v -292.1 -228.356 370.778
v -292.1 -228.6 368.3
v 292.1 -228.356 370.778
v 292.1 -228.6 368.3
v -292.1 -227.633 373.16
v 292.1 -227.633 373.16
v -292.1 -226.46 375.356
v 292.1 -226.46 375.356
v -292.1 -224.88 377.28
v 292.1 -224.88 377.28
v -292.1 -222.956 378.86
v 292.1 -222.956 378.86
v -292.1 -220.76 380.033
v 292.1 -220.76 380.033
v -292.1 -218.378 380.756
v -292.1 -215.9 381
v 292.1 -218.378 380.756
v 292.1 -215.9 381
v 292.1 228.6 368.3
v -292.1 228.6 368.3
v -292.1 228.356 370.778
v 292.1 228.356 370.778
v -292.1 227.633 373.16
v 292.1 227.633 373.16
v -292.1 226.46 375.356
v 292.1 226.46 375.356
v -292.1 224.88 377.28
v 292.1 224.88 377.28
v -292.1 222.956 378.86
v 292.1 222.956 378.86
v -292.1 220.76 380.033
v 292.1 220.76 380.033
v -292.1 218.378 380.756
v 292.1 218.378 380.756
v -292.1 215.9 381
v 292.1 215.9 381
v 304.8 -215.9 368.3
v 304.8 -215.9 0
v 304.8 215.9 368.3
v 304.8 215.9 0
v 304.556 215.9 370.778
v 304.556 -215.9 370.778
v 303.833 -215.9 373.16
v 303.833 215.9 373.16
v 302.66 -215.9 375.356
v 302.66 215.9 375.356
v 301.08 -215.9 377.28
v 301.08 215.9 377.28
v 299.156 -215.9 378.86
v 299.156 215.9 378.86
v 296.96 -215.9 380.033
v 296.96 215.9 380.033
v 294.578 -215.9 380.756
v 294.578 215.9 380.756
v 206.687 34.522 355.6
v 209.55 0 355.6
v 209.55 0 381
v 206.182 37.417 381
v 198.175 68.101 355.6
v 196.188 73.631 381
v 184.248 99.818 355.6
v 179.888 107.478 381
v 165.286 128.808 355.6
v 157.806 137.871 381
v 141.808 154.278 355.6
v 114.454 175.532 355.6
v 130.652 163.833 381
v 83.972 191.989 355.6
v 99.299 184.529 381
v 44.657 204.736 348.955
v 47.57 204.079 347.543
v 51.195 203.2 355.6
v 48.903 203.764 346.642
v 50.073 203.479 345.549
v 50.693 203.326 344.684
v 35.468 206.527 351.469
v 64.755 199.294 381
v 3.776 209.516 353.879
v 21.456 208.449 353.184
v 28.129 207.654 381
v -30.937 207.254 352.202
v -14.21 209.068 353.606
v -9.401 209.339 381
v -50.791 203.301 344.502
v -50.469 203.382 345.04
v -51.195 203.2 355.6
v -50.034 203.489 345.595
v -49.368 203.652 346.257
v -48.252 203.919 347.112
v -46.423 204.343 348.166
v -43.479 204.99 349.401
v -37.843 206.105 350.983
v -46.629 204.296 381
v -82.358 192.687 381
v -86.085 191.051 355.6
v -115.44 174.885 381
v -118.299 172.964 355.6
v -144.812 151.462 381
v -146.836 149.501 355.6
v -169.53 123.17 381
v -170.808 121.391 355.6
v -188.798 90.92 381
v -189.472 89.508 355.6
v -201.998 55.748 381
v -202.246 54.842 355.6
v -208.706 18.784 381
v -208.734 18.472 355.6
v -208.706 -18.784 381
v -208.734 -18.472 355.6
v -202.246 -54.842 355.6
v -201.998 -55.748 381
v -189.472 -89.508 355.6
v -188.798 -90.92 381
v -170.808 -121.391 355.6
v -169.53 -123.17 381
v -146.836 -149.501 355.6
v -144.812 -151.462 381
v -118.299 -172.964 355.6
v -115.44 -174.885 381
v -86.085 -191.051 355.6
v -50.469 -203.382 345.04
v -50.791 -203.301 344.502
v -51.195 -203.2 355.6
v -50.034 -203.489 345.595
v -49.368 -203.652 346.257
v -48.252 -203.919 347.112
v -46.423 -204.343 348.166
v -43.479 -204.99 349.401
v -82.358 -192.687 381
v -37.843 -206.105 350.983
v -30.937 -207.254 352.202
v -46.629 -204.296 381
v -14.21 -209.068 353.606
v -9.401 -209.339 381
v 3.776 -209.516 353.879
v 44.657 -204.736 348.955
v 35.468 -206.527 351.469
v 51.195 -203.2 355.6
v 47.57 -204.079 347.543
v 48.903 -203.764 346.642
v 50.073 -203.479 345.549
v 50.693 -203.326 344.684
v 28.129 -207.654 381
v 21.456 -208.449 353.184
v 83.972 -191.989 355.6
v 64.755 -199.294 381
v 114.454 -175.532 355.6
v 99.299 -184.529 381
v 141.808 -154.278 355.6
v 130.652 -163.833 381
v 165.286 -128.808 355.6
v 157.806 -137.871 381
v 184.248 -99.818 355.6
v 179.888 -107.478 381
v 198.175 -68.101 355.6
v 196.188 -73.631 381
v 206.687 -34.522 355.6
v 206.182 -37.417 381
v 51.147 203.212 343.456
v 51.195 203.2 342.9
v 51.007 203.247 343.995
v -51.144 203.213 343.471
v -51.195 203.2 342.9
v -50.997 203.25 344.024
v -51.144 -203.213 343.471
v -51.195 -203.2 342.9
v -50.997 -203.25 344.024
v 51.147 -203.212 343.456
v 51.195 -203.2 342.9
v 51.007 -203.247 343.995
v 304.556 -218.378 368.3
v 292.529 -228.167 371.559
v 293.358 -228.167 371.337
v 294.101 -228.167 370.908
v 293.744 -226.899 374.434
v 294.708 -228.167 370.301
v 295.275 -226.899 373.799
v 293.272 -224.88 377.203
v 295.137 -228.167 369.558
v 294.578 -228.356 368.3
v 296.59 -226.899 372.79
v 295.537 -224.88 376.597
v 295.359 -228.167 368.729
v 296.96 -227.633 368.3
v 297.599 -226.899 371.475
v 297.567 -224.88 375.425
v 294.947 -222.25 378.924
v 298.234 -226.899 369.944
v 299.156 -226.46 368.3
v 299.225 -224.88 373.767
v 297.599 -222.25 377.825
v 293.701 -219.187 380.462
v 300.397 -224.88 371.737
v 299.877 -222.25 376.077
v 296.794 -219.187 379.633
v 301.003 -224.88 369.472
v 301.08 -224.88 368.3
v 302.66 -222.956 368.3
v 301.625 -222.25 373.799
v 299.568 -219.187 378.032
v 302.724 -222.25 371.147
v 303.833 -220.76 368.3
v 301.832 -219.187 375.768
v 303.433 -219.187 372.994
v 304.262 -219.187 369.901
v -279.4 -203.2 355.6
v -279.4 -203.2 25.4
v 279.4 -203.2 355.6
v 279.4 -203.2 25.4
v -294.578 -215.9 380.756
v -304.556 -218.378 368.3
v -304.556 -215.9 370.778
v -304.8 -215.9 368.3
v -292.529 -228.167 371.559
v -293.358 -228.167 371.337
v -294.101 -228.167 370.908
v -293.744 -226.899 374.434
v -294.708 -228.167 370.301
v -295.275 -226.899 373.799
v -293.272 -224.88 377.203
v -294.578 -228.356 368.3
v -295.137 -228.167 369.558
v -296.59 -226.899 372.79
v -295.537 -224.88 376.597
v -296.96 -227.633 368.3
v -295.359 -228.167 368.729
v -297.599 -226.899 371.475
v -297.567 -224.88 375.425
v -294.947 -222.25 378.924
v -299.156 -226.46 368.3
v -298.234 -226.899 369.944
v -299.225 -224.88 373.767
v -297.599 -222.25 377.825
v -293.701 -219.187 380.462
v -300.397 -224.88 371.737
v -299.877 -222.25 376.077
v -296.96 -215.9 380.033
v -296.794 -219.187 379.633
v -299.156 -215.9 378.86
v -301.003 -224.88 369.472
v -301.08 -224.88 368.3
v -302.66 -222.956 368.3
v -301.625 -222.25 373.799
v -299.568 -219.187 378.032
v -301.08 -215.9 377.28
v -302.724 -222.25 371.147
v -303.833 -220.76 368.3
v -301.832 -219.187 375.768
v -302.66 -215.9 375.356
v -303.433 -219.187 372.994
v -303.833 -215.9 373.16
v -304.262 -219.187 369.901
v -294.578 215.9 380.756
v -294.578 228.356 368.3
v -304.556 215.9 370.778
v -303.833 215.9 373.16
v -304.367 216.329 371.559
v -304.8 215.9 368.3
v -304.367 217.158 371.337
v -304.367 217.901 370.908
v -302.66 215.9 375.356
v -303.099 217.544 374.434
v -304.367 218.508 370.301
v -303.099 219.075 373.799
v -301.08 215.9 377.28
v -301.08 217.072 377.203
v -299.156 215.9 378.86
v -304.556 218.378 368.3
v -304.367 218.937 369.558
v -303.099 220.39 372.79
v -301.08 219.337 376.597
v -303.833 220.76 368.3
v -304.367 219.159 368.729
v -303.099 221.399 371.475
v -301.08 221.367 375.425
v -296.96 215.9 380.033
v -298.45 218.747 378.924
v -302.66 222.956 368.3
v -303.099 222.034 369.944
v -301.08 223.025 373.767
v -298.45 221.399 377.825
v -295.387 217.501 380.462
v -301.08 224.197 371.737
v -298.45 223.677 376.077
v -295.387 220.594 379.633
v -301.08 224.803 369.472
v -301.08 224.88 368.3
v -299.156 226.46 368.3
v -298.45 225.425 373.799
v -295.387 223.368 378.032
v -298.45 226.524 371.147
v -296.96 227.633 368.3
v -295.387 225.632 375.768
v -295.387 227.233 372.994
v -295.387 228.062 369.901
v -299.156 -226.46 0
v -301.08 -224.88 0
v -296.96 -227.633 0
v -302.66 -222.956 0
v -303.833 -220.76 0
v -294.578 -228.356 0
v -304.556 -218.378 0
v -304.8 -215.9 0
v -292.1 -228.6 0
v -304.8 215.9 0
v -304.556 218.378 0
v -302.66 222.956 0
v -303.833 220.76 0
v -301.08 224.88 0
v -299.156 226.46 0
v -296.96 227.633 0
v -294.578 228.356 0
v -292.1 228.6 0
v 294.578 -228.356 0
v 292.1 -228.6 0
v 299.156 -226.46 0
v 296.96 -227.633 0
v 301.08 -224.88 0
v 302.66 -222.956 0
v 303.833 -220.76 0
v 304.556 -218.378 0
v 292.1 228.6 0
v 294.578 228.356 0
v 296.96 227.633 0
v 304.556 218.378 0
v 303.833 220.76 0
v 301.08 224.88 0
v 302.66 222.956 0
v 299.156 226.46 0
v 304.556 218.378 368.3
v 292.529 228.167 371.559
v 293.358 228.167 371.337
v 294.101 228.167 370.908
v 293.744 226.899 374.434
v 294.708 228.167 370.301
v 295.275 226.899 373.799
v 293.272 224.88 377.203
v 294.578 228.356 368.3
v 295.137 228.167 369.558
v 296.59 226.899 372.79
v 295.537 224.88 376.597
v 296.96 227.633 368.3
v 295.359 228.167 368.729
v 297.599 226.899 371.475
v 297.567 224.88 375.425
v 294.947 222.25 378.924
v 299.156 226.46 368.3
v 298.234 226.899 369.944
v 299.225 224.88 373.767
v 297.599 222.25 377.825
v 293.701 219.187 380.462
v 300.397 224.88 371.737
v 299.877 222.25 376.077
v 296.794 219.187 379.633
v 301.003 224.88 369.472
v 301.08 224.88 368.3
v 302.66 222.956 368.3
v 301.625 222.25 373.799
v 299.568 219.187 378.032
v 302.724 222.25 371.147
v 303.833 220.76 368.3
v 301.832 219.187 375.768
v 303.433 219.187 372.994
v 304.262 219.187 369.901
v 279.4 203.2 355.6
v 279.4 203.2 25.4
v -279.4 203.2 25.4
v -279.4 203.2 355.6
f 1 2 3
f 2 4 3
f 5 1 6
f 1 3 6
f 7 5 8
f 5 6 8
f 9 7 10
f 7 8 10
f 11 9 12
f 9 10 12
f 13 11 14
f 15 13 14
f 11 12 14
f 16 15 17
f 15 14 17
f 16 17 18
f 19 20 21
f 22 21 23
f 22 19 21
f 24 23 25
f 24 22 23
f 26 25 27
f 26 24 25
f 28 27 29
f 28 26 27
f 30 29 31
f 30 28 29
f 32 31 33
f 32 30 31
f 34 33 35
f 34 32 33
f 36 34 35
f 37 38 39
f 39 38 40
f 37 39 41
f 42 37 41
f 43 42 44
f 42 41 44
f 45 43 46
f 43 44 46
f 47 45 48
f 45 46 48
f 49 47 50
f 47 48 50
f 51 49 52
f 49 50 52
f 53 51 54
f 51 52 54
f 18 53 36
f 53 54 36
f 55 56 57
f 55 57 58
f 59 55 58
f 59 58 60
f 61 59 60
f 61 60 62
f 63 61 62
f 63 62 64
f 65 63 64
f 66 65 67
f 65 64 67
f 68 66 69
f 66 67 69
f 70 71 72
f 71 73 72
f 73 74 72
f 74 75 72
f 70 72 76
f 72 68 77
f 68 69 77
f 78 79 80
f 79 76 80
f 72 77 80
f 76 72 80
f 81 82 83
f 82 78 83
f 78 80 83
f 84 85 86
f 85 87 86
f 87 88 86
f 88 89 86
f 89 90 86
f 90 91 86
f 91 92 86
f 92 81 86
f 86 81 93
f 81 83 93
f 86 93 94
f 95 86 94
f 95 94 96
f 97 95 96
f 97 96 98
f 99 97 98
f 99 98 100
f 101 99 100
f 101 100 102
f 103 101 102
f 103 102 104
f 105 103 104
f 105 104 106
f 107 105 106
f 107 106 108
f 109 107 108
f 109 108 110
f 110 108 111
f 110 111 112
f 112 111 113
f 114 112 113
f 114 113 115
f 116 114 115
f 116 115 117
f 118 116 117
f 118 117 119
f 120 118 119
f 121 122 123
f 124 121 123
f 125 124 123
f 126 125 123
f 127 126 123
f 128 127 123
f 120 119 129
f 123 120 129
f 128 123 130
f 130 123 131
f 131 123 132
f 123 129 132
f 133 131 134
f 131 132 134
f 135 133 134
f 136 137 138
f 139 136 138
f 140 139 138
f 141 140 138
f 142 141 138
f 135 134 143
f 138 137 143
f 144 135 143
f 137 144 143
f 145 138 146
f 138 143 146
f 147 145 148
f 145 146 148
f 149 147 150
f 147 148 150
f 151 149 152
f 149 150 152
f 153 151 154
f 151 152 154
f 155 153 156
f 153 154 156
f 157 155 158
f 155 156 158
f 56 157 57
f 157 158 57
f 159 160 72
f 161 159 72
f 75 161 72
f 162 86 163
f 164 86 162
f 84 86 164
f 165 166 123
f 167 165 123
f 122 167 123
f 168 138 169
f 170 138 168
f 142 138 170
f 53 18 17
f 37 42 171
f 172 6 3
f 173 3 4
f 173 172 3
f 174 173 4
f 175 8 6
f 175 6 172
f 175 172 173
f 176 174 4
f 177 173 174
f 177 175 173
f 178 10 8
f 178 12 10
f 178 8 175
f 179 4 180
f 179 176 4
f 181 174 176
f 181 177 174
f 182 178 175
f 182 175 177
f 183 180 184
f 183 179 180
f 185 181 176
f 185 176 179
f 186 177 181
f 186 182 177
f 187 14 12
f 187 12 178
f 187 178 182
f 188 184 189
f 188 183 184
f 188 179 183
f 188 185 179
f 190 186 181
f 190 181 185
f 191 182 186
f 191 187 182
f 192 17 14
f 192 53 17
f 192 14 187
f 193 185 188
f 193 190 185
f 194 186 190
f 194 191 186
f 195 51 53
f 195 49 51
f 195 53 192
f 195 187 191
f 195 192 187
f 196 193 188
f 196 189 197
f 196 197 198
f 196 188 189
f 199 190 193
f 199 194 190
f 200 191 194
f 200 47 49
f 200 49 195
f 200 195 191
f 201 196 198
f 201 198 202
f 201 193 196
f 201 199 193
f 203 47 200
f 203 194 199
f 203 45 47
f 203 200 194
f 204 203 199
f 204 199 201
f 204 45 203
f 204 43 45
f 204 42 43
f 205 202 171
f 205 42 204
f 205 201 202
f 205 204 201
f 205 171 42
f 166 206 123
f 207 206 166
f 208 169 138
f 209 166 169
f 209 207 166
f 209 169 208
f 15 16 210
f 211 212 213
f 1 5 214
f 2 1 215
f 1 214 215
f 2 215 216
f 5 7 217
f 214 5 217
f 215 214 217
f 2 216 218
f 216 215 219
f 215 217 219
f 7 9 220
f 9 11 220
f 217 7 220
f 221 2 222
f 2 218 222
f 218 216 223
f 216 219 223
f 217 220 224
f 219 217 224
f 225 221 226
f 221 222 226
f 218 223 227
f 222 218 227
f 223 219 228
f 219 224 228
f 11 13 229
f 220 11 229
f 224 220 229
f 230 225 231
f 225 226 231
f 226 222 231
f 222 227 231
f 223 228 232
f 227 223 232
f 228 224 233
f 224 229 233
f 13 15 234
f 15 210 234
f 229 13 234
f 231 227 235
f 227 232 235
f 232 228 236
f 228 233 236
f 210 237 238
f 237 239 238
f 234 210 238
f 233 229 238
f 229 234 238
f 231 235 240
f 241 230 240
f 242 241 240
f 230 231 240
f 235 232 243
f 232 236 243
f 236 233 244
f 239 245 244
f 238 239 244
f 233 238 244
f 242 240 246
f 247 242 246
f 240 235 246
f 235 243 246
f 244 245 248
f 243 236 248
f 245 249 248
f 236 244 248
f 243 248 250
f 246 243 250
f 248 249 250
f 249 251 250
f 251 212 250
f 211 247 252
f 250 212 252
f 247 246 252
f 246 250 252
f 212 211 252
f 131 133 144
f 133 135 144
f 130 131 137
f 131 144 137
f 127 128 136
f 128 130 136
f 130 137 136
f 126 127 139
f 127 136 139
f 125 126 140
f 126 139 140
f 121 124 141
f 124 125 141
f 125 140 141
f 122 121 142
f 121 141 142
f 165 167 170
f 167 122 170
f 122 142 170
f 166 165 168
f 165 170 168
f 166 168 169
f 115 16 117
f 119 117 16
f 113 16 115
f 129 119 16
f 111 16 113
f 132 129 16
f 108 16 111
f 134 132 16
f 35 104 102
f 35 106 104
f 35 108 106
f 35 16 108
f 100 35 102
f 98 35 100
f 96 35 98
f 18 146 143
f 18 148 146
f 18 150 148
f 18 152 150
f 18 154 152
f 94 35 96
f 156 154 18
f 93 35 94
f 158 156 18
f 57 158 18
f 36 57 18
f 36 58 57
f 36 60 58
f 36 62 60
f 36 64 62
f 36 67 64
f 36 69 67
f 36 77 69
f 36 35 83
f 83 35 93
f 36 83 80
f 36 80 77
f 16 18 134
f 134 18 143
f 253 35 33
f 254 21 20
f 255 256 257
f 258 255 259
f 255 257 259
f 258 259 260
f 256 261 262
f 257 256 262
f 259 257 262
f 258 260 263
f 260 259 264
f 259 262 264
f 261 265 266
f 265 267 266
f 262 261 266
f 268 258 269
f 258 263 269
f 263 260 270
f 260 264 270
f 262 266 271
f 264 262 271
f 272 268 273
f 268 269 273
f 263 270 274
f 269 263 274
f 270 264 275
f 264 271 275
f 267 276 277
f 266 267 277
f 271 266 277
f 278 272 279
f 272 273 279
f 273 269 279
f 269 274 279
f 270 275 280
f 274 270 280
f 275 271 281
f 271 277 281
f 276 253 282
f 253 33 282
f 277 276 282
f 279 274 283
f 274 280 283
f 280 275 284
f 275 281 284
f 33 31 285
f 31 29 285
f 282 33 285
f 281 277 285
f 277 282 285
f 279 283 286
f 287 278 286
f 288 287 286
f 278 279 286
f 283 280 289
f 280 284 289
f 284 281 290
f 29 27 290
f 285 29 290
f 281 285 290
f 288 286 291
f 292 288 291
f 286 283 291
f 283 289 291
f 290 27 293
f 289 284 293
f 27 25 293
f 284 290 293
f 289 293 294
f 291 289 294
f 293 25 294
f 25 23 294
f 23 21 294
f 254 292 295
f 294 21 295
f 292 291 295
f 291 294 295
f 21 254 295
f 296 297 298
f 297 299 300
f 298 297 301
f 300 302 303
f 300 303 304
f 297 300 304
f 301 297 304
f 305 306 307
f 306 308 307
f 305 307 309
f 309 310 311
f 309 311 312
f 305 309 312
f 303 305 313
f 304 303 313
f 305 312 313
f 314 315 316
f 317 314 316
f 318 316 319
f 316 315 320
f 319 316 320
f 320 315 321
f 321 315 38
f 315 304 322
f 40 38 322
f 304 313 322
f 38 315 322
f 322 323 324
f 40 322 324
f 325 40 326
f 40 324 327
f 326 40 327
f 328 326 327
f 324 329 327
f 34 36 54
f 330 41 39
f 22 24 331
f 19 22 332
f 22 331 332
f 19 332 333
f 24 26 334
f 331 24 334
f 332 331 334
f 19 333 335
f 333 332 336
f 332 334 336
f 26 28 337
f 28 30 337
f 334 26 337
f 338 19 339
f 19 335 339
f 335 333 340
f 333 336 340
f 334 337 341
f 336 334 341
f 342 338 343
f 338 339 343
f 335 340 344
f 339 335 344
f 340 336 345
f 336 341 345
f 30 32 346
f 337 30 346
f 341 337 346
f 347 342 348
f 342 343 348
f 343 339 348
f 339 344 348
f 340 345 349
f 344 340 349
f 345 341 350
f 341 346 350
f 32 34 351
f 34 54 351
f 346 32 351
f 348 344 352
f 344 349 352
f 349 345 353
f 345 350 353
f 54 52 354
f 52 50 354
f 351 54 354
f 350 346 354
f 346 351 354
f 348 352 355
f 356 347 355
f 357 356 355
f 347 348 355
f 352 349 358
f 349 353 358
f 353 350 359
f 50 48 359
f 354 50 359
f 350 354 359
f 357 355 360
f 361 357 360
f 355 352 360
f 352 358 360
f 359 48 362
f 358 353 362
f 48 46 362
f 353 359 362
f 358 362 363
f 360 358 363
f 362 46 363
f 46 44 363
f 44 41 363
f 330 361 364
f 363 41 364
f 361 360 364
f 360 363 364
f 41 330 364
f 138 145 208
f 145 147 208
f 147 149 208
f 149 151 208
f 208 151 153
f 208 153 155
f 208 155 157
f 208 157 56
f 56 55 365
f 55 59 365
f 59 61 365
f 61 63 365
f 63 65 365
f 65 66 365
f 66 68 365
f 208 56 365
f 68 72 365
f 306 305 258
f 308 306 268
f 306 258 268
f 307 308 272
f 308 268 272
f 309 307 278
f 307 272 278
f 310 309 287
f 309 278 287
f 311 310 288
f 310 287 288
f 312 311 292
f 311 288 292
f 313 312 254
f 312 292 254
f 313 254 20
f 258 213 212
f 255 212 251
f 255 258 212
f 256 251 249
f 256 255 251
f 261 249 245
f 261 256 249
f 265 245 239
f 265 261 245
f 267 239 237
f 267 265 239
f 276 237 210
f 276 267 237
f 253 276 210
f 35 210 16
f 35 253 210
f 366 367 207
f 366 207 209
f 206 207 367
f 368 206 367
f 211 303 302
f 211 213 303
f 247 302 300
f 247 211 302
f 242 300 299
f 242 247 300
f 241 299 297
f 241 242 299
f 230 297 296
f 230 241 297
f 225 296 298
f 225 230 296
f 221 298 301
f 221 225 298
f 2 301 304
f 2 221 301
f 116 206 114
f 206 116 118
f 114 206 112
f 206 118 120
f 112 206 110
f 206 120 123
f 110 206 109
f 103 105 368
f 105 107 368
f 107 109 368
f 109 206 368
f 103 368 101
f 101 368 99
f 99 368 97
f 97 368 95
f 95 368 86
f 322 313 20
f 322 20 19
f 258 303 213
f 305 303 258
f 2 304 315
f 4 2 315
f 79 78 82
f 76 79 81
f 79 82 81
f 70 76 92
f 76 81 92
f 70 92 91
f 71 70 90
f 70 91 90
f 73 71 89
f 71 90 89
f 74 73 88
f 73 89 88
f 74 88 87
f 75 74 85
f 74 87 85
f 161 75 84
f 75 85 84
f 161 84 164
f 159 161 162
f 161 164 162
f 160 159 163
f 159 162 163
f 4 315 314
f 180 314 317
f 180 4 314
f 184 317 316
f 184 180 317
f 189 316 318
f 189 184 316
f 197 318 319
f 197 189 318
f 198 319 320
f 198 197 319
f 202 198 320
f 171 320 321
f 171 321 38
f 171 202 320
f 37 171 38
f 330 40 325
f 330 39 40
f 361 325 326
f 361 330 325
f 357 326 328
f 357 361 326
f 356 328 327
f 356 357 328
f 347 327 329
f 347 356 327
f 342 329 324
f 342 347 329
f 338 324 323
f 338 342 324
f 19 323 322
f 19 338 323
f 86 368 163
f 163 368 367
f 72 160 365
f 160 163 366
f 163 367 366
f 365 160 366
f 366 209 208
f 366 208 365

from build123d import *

# Parameters (mm, degrees)
F0_W         = 609.6
F0_H         = 457.2
F1_DEPTH     = 381
F2_R         = 12.7
F3_T         = -25.4
F4_R         = 209.55
F5_DEPTH     = 25.4
F6_T4_DEPTH  = 165.8906734034
F6_S5_R      = 209.55
F6_T6_DEPTH  = 85
F6_T10_DEPTH = 165.8906734034
F6_S11_R     = 209.55
F6_T12_DEPTH = 85


# Not quite as in the source:
# - a fillet or chamfer that OpenCascade refuses, or shapes differently, is made with other operations: its cross-section is extruded or revolved along the edge and cut away or added


with BuildPart() as f1:
    # F0 (on Top) → F1 (new body)
    with BuildSketch(Plane.XY):
        Rectangle(F0_W, F0_H)
    extrude(amount=F1_DEPTH)

    # F2
    f2_edges = [f1.edges().sort_by_distance(p)[0] for p in [
        (304.8, 0, 381),
        (0, 228.6, 381),
        (-304.8, 0, 381),
        (0, -228.6, 381),
        (-304.8, -228.6, 190.5),
        (304.8, -228.6, 190.5),
        (304.8, 228.6, 190.5),
        (-304.8, 228.6, 190.5),
    ]]
    fillet(f2_edges, radius=F2_R)

    # F3 (hollow: no face is removed)
    offset(amount=F3_T, mode=Mode.SUBTRACT)

    # F4 (on face) → F5 (cut)
    with BuildSketch(Plane.XY.offset(381)):
        Circle(F4_R)
    extrude(amount=-F5_DEPTH, mode=Mode.SUBTRACT)

    # F6: fillet of radius 12.7 on 2 edges, made by hand


with BuildPart() as f6_tool2:
    # F6_s3 → F6_t4 (new body)
    with BuildSketch(Plane.YZ.offset(82.9453367017)):
        with BuildLine():
            ThreePointArc((-215.9, 355.6), (-206.9197438789, 351.8802561211), (-203.2, 342.9))
            Line((-203.2, 342.9), (-203.2, 355.6))
            Line((-203.2, 355.6), (-215.9, 355.6))
        make_face()
    extrude(amount=-F6_T4_DEPTH)

    # F6_s5 → F6_t6 (intersect, symmetric)
    with BuildSketch(Plane.XY.offset(349.3)):
        Circle(F6_S5_R)
    extrude(amount=F6_T6_DEPTH, both=True, mode=Mode.INTERSECT)


with BuildPart() as f1_1:
    add(f1.part)

    # F6_t1: cut F6_tool2
    add(f6_tool2.part, mode=Mode.SUBTRACT)


with BuildPart() as f6_tool8:
    # F6_s9 → F6_t10 (new body)
    with BuildSketch(Plane.YZ.offset(-82.9453367017)):
        with BuildLine():
            ThreePointArc((215.9, 355.6), (206.9197438789, 351.8802561211), (203.2, 342.9))
            Line((203.2, 342.9), (203.2, 355.6))
            Line((203.2, 355.6), (215.9, 355.6))
        make_face()
    extrude(amount=F6_T10_DEPTH)

    # F6_s11 → F6_t12 (intersect, symmetric)
    with BuildSketch(Plane.XY.offset(349.3)):
        Circle(F6_S11_R)
    extrude(amount=F6_T12_DEPTH, both=True, mode=Mode.INTERSECT)


with BuildPart() as f1_2:
    add(f1_1.part)

    # F6_t7: cut F6_tool8
    add(f6_tool8.part, mode=Mode.SUBTRACT)


solid = f1_2.part
